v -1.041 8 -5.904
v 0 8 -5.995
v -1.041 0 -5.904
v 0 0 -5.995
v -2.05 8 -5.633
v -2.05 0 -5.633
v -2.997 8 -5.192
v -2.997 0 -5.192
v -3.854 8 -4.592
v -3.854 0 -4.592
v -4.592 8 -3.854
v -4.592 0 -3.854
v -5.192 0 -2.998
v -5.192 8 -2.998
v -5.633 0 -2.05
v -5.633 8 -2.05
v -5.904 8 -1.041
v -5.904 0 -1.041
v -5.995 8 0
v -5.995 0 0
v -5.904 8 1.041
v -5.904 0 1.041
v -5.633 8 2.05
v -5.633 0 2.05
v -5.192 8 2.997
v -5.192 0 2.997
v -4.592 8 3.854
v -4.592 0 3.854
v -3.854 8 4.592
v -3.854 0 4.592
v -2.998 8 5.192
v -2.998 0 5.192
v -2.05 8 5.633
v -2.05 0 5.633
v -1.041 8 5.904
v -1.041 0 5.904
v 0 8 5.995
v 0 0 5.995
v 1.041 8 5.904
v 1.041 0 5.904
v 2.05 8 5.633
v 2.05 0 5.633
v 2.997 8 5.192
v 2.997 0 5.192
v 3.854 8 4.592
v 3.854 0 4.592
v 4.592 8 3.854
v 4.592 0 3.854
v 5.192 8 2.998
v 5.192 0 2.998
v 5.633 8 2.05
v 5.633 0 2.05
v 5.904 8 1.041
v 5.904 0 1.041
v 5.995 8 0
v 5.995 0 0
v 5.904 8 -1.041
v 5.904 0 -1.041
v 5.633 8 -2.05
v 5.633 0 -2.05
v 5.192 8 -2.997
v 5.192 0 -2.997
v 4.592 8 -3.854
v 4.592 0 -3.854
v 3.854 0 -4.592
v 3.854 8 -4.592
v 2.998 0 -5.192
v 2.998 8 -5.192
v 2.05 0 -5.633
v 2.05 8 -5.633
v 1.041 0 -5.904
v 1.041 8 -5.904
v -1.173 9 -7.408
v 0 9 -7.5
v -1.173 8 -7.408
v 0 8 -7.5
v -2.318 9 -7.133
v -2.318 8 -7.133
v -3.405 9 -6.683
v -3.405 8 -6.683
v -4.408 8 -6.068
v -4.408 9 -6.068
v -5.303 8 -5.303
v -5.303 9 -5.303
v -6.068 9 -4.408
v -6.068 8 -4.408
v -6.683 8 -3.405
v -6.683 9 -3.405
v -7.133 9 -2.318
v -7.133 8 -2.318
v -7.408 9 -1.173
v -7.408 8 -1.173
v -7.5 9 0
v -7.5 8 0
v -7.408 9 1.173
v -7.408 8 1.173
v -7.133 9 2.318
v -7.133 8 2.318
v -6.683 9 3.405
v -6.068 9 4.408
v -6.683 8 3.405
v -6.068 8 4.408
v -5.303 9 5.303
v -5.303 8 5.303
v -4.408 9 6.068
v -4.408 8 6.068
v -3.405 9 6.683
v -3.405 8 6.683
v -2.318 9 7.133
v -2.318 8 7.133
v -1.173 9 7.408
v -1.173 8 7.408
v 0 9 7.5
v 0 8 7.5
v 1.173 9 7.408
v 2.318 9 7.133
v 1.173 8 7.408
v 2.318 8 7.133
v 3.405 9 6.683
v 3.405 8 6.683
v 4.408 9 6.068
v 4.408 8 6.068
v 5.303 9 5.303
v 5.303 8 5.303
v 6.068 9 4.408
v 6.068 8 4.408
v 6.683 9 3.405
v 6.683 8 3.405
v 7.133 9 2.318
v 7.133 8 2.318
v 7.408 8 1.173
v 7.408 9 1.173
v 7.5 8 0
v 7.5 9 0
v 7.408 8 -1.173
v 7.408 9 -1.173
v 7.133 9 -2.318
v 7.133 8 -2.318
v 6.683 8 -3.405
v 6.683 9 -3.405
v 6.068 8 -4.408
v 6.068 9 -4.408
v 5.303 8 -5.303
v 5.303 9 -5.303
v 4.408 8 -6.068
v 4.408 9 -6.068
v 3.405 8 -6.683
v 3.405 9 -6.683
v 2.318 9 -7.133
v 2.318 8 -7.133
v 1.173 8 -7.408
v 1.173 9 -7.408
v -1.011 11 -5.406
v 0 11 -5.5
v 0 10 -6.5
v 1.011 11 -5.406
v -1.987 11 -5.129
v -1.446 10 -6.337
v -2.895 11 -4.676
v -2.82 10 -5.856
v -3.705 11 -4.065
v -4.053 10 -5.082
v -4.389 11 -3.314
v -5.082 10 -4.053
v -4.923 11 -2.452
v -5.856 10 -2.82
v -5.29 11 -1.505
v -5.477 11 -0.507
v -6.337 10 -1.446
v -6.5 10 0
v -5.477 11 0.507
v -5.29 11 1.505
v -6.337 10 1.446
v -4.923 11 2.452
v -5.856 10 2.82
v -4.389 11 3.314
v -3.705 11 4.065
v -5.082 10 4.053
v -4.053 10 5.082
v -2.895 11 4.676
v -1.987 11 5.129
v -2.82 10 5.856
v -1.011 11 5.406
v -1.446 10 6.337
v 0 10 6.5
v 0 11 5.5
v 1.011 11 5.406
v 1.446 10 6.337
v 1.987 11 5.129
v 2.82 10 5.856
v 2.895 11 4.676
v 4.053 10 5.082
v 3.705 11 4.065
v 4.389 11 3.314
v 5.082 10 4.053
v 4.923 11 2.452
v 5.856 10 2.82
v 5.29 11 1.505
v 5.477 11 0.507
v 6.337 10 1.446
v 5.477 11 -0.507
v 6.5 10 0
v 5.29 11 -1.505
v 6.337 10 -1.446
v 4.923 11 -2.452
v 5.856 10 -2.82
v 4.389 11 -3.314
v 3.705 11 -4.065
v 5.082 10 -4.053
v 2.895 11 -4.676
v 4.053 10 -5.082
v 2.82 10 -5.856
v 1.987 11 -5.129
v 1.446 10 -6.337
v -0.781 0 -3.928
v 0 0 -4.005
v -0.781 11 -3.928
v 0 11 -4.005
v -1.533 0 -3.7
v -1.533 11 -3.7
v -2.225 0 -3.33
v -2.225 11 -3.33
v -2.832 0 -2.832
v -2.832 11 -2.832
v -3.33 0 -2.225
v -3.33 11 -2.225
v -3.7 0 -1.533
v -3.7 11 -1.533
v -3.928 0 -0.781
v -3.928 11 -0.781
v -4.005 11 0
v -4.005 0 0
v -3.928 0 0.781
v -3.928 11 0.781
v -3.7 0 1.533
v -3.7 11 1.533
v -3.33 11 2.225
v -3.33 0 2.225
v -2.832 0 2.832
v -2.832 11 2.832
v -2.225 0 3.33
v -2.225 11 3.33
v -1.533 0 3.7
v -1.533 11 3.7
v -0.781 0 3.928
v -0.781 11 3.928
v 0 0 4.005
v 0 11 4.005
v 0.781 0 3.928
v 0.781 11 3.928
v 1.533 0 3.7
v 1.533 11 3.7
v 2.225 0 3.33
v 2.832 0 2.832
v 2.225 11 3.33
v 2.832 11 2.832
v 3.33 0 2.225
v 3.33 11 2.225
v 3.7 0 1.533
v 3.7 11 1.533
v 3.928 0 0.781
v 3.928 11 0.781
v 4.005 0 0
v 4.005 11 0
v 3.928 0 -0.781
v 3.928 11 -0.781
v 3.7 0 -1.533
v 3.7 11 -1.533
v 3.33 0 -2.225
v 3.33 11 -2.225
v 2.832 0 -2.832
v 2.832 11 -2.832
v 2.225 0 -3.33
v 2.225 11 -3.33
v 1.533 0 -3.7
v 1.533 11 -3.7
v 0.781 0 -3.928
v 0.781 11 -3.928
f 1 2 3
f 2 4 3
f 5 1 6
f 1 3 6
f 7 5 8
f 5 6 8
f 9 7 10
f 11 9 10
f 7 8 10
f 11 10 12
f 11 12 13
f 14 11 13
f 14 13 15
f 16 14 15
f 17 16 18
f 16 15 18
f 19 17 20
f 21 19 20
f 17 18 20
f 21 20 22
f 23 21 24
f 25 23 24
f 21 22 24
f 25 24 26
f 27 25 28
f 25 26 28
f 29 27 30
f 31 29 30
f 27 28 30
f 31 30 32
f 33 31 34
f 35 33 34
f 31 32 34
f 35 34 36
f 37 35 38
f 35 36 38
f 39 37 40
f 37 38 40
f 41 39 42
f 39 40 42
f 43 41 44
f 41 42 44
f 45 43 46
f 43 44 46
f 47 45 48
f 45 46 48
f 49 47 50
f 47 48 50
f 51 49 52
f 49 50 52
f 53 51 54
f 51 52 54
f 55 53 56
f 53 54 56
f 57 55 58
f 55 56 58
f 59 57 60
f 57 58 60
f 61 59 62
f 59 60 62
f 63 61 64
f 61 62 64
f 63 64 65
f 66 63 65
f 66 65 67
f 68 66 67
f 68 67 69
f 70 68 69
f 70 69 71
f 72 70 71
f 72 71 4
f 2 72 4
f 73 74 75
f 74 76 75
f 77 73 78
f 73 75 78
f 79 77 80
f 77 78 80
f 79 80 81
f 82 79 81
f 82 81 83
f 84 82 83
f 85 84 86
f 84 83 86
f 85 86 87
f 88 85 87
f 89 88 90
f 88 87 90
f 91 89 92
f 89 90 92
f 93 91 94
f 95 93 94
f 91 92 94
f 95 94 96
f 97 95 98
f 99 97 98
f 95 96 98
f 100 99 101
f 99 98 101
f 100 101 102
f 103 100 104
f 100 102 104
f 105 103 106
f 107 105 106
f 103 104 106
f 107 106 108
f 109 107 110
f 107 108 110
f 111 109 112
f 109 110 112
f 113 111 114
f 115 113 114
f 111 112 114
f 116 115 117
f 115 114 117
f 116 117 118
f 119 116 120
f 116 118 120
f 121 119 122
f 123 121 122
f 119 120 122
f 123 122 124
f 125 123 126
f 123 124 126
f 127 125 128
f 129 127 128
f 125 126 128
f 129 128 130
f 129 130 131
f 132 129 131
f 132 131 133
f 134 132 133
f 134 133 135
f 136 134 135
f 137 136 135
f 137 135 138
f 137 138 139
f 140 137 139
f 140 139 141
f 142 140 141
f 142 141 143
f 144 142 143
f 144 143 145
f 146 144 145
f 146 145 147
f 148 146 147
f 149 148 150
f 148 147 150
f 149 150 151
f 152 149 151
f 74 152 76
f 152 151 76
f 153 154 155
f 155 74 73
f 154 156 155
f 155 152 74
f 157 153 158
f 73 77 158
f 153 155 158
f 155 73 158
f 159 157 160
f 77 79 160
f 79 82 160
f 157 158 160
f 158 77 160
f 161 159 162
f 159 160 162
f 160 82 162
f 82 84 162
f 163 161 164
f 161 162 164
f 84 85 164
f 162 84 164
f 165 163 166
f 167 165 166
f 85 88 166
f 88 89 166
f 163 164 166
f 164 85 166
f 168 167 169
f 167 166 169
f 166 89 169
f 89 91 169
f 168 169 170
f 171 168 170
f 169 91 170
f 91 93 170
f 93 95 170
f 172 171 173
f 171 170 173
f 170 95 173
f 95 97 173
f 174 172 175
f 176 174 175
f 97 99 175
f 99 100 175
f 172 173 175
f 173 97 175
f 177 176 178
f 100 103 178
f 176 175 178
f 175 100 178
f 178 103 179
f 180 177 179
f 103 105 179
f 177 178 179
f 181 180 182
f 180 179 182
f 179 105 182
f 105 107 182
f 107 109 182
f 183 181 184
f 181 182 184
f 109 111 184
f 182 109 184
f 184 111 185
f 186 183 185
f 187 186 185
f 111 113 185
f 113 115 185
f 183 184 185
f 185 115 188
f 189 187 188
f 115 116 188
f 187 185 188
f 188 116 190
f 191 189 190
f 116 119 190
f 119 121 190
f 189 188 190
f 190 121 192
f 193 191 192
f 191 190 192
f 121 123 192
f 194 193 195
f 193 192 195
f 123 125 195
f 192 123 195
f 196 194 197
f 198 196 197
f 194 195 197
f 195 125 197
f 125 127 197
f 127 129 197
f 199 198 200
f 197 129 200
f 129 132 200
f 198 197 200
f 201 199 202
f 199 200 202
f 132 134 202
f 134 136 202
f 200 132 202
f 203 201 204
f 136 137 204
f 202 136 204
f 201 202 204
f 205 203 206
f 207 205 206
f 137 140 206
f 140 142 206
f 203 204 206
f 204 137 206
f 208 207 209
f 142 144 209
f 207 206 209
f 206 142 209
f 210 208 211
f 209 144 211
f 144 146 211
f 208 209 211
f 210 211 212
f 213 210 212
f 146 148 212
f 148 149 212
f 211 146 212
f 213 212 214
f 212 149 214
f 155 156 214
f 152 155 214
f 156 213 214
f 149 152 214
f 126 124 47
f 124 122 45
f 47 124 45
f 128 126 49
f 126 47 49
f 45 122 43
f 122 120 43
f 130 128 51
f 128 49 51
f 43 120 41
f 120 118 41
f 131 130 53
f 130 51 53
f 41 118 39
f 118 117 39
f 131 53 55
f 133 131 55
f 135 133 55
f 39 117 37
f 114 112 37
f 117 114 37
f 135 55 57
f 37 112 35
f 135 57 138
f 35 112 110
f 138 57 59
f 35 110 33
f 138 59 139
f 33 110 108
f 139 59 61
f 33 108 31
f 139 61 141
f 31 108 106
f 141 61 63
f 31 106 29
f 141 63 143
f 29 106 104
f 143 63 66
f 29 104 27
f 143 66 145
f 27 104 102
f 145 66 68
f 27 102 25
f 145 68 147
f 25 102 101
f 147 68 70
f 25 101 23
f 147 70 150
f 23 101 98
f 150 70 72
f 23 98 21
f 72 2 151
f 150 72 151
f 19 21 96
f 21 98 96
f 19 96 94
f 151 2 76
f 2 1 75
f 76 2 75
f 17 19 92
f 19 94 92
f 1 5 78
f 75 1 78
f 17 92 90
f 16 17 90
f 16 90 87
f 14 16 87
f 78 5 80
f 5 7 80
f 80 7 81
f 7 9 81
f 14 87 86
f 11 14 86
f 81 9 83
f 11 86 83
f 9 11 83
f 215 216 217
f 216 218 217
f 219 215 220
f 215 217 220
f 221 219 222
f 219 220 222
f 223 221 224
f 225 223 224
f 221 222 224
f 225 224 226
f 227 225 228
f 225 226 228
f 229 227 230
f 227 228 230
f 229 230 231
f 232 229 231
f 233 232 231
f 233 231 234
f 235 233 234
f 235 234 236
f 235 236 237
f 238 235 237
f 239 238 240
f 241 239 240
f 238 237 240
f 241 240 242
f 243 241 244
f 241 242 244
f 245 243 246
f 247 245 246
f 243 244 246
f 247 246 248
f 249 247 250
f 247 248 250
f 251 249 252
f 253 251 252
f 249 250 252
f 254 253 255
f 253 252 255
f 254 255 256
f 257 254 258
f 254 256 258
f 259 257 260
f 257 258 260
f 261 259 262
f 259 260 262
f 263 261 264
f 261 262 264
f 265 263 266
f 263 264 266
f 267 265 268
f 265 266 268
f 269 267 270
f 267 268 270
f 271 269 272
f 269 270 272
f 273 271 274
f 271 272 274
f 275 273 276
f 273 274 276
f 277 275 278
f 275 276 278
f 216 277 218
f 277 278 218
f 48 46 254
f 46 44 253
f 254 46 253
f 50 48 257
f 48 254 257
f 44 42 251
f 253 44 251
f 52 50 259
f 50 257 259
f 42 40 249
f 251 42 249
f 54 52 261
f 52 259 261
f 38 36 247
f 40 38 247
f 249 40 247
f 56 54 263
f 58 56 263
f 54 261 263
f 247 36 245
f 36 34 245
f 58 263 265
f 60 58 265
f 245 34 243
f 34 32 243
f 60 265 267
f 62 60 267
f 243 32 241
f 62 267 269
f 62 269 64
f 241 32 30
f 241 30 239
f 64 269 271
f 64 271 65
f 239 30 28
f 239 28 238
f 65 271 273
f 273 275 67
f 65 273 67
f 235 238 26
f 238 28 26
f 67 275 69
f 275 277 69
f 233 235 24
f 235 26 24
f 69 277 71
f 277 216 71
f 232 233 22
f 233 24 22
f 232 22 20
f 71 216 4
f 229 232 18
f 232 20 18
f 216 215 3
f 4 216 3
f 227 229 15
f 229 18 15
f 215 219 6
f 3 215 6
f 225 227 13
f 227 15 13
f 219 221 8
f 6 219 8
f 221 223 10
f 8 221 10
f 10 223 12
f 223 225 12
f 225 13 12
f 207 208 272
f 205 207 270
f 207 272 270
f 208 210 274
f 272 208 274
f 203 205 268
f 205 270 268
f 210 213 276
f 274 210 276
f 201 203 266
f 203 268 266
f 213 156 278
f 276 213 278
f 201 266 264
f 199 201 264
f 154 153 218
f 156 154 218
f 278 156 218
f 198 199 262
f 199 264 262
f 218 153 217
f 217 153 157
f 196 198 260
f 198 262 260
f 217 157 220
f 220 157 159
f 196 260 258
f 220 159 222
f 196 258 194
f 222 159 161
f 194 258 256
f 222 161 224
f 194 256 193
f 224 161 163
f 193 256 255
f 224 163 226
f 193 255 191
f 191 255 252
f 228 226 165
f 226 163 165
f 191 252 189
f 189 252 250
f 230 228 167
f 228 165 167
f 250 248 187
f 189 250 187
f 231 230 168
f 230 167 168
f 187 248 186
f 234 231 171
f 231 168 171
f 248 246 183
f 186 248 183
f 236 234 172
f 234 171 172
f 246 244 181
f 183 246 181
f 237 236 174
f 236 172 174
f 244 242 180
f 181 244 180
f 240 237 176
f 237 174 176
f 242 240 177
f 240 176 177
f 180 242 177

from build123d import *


with BuildPart() as part:
    # Sketch1 → Revolve1 (revolve)
    with BuildSketch(Plane.XY):
        Polygon((4.005, 0), (4.005, 11), (5.5, 11), (7.5, 9), (7.5, 8), (5.995, 8), (5.995, 0), align=None)
    revolve(axis=Axis((0, 0, 0), (0, 1, 0)))


solid = part.part
